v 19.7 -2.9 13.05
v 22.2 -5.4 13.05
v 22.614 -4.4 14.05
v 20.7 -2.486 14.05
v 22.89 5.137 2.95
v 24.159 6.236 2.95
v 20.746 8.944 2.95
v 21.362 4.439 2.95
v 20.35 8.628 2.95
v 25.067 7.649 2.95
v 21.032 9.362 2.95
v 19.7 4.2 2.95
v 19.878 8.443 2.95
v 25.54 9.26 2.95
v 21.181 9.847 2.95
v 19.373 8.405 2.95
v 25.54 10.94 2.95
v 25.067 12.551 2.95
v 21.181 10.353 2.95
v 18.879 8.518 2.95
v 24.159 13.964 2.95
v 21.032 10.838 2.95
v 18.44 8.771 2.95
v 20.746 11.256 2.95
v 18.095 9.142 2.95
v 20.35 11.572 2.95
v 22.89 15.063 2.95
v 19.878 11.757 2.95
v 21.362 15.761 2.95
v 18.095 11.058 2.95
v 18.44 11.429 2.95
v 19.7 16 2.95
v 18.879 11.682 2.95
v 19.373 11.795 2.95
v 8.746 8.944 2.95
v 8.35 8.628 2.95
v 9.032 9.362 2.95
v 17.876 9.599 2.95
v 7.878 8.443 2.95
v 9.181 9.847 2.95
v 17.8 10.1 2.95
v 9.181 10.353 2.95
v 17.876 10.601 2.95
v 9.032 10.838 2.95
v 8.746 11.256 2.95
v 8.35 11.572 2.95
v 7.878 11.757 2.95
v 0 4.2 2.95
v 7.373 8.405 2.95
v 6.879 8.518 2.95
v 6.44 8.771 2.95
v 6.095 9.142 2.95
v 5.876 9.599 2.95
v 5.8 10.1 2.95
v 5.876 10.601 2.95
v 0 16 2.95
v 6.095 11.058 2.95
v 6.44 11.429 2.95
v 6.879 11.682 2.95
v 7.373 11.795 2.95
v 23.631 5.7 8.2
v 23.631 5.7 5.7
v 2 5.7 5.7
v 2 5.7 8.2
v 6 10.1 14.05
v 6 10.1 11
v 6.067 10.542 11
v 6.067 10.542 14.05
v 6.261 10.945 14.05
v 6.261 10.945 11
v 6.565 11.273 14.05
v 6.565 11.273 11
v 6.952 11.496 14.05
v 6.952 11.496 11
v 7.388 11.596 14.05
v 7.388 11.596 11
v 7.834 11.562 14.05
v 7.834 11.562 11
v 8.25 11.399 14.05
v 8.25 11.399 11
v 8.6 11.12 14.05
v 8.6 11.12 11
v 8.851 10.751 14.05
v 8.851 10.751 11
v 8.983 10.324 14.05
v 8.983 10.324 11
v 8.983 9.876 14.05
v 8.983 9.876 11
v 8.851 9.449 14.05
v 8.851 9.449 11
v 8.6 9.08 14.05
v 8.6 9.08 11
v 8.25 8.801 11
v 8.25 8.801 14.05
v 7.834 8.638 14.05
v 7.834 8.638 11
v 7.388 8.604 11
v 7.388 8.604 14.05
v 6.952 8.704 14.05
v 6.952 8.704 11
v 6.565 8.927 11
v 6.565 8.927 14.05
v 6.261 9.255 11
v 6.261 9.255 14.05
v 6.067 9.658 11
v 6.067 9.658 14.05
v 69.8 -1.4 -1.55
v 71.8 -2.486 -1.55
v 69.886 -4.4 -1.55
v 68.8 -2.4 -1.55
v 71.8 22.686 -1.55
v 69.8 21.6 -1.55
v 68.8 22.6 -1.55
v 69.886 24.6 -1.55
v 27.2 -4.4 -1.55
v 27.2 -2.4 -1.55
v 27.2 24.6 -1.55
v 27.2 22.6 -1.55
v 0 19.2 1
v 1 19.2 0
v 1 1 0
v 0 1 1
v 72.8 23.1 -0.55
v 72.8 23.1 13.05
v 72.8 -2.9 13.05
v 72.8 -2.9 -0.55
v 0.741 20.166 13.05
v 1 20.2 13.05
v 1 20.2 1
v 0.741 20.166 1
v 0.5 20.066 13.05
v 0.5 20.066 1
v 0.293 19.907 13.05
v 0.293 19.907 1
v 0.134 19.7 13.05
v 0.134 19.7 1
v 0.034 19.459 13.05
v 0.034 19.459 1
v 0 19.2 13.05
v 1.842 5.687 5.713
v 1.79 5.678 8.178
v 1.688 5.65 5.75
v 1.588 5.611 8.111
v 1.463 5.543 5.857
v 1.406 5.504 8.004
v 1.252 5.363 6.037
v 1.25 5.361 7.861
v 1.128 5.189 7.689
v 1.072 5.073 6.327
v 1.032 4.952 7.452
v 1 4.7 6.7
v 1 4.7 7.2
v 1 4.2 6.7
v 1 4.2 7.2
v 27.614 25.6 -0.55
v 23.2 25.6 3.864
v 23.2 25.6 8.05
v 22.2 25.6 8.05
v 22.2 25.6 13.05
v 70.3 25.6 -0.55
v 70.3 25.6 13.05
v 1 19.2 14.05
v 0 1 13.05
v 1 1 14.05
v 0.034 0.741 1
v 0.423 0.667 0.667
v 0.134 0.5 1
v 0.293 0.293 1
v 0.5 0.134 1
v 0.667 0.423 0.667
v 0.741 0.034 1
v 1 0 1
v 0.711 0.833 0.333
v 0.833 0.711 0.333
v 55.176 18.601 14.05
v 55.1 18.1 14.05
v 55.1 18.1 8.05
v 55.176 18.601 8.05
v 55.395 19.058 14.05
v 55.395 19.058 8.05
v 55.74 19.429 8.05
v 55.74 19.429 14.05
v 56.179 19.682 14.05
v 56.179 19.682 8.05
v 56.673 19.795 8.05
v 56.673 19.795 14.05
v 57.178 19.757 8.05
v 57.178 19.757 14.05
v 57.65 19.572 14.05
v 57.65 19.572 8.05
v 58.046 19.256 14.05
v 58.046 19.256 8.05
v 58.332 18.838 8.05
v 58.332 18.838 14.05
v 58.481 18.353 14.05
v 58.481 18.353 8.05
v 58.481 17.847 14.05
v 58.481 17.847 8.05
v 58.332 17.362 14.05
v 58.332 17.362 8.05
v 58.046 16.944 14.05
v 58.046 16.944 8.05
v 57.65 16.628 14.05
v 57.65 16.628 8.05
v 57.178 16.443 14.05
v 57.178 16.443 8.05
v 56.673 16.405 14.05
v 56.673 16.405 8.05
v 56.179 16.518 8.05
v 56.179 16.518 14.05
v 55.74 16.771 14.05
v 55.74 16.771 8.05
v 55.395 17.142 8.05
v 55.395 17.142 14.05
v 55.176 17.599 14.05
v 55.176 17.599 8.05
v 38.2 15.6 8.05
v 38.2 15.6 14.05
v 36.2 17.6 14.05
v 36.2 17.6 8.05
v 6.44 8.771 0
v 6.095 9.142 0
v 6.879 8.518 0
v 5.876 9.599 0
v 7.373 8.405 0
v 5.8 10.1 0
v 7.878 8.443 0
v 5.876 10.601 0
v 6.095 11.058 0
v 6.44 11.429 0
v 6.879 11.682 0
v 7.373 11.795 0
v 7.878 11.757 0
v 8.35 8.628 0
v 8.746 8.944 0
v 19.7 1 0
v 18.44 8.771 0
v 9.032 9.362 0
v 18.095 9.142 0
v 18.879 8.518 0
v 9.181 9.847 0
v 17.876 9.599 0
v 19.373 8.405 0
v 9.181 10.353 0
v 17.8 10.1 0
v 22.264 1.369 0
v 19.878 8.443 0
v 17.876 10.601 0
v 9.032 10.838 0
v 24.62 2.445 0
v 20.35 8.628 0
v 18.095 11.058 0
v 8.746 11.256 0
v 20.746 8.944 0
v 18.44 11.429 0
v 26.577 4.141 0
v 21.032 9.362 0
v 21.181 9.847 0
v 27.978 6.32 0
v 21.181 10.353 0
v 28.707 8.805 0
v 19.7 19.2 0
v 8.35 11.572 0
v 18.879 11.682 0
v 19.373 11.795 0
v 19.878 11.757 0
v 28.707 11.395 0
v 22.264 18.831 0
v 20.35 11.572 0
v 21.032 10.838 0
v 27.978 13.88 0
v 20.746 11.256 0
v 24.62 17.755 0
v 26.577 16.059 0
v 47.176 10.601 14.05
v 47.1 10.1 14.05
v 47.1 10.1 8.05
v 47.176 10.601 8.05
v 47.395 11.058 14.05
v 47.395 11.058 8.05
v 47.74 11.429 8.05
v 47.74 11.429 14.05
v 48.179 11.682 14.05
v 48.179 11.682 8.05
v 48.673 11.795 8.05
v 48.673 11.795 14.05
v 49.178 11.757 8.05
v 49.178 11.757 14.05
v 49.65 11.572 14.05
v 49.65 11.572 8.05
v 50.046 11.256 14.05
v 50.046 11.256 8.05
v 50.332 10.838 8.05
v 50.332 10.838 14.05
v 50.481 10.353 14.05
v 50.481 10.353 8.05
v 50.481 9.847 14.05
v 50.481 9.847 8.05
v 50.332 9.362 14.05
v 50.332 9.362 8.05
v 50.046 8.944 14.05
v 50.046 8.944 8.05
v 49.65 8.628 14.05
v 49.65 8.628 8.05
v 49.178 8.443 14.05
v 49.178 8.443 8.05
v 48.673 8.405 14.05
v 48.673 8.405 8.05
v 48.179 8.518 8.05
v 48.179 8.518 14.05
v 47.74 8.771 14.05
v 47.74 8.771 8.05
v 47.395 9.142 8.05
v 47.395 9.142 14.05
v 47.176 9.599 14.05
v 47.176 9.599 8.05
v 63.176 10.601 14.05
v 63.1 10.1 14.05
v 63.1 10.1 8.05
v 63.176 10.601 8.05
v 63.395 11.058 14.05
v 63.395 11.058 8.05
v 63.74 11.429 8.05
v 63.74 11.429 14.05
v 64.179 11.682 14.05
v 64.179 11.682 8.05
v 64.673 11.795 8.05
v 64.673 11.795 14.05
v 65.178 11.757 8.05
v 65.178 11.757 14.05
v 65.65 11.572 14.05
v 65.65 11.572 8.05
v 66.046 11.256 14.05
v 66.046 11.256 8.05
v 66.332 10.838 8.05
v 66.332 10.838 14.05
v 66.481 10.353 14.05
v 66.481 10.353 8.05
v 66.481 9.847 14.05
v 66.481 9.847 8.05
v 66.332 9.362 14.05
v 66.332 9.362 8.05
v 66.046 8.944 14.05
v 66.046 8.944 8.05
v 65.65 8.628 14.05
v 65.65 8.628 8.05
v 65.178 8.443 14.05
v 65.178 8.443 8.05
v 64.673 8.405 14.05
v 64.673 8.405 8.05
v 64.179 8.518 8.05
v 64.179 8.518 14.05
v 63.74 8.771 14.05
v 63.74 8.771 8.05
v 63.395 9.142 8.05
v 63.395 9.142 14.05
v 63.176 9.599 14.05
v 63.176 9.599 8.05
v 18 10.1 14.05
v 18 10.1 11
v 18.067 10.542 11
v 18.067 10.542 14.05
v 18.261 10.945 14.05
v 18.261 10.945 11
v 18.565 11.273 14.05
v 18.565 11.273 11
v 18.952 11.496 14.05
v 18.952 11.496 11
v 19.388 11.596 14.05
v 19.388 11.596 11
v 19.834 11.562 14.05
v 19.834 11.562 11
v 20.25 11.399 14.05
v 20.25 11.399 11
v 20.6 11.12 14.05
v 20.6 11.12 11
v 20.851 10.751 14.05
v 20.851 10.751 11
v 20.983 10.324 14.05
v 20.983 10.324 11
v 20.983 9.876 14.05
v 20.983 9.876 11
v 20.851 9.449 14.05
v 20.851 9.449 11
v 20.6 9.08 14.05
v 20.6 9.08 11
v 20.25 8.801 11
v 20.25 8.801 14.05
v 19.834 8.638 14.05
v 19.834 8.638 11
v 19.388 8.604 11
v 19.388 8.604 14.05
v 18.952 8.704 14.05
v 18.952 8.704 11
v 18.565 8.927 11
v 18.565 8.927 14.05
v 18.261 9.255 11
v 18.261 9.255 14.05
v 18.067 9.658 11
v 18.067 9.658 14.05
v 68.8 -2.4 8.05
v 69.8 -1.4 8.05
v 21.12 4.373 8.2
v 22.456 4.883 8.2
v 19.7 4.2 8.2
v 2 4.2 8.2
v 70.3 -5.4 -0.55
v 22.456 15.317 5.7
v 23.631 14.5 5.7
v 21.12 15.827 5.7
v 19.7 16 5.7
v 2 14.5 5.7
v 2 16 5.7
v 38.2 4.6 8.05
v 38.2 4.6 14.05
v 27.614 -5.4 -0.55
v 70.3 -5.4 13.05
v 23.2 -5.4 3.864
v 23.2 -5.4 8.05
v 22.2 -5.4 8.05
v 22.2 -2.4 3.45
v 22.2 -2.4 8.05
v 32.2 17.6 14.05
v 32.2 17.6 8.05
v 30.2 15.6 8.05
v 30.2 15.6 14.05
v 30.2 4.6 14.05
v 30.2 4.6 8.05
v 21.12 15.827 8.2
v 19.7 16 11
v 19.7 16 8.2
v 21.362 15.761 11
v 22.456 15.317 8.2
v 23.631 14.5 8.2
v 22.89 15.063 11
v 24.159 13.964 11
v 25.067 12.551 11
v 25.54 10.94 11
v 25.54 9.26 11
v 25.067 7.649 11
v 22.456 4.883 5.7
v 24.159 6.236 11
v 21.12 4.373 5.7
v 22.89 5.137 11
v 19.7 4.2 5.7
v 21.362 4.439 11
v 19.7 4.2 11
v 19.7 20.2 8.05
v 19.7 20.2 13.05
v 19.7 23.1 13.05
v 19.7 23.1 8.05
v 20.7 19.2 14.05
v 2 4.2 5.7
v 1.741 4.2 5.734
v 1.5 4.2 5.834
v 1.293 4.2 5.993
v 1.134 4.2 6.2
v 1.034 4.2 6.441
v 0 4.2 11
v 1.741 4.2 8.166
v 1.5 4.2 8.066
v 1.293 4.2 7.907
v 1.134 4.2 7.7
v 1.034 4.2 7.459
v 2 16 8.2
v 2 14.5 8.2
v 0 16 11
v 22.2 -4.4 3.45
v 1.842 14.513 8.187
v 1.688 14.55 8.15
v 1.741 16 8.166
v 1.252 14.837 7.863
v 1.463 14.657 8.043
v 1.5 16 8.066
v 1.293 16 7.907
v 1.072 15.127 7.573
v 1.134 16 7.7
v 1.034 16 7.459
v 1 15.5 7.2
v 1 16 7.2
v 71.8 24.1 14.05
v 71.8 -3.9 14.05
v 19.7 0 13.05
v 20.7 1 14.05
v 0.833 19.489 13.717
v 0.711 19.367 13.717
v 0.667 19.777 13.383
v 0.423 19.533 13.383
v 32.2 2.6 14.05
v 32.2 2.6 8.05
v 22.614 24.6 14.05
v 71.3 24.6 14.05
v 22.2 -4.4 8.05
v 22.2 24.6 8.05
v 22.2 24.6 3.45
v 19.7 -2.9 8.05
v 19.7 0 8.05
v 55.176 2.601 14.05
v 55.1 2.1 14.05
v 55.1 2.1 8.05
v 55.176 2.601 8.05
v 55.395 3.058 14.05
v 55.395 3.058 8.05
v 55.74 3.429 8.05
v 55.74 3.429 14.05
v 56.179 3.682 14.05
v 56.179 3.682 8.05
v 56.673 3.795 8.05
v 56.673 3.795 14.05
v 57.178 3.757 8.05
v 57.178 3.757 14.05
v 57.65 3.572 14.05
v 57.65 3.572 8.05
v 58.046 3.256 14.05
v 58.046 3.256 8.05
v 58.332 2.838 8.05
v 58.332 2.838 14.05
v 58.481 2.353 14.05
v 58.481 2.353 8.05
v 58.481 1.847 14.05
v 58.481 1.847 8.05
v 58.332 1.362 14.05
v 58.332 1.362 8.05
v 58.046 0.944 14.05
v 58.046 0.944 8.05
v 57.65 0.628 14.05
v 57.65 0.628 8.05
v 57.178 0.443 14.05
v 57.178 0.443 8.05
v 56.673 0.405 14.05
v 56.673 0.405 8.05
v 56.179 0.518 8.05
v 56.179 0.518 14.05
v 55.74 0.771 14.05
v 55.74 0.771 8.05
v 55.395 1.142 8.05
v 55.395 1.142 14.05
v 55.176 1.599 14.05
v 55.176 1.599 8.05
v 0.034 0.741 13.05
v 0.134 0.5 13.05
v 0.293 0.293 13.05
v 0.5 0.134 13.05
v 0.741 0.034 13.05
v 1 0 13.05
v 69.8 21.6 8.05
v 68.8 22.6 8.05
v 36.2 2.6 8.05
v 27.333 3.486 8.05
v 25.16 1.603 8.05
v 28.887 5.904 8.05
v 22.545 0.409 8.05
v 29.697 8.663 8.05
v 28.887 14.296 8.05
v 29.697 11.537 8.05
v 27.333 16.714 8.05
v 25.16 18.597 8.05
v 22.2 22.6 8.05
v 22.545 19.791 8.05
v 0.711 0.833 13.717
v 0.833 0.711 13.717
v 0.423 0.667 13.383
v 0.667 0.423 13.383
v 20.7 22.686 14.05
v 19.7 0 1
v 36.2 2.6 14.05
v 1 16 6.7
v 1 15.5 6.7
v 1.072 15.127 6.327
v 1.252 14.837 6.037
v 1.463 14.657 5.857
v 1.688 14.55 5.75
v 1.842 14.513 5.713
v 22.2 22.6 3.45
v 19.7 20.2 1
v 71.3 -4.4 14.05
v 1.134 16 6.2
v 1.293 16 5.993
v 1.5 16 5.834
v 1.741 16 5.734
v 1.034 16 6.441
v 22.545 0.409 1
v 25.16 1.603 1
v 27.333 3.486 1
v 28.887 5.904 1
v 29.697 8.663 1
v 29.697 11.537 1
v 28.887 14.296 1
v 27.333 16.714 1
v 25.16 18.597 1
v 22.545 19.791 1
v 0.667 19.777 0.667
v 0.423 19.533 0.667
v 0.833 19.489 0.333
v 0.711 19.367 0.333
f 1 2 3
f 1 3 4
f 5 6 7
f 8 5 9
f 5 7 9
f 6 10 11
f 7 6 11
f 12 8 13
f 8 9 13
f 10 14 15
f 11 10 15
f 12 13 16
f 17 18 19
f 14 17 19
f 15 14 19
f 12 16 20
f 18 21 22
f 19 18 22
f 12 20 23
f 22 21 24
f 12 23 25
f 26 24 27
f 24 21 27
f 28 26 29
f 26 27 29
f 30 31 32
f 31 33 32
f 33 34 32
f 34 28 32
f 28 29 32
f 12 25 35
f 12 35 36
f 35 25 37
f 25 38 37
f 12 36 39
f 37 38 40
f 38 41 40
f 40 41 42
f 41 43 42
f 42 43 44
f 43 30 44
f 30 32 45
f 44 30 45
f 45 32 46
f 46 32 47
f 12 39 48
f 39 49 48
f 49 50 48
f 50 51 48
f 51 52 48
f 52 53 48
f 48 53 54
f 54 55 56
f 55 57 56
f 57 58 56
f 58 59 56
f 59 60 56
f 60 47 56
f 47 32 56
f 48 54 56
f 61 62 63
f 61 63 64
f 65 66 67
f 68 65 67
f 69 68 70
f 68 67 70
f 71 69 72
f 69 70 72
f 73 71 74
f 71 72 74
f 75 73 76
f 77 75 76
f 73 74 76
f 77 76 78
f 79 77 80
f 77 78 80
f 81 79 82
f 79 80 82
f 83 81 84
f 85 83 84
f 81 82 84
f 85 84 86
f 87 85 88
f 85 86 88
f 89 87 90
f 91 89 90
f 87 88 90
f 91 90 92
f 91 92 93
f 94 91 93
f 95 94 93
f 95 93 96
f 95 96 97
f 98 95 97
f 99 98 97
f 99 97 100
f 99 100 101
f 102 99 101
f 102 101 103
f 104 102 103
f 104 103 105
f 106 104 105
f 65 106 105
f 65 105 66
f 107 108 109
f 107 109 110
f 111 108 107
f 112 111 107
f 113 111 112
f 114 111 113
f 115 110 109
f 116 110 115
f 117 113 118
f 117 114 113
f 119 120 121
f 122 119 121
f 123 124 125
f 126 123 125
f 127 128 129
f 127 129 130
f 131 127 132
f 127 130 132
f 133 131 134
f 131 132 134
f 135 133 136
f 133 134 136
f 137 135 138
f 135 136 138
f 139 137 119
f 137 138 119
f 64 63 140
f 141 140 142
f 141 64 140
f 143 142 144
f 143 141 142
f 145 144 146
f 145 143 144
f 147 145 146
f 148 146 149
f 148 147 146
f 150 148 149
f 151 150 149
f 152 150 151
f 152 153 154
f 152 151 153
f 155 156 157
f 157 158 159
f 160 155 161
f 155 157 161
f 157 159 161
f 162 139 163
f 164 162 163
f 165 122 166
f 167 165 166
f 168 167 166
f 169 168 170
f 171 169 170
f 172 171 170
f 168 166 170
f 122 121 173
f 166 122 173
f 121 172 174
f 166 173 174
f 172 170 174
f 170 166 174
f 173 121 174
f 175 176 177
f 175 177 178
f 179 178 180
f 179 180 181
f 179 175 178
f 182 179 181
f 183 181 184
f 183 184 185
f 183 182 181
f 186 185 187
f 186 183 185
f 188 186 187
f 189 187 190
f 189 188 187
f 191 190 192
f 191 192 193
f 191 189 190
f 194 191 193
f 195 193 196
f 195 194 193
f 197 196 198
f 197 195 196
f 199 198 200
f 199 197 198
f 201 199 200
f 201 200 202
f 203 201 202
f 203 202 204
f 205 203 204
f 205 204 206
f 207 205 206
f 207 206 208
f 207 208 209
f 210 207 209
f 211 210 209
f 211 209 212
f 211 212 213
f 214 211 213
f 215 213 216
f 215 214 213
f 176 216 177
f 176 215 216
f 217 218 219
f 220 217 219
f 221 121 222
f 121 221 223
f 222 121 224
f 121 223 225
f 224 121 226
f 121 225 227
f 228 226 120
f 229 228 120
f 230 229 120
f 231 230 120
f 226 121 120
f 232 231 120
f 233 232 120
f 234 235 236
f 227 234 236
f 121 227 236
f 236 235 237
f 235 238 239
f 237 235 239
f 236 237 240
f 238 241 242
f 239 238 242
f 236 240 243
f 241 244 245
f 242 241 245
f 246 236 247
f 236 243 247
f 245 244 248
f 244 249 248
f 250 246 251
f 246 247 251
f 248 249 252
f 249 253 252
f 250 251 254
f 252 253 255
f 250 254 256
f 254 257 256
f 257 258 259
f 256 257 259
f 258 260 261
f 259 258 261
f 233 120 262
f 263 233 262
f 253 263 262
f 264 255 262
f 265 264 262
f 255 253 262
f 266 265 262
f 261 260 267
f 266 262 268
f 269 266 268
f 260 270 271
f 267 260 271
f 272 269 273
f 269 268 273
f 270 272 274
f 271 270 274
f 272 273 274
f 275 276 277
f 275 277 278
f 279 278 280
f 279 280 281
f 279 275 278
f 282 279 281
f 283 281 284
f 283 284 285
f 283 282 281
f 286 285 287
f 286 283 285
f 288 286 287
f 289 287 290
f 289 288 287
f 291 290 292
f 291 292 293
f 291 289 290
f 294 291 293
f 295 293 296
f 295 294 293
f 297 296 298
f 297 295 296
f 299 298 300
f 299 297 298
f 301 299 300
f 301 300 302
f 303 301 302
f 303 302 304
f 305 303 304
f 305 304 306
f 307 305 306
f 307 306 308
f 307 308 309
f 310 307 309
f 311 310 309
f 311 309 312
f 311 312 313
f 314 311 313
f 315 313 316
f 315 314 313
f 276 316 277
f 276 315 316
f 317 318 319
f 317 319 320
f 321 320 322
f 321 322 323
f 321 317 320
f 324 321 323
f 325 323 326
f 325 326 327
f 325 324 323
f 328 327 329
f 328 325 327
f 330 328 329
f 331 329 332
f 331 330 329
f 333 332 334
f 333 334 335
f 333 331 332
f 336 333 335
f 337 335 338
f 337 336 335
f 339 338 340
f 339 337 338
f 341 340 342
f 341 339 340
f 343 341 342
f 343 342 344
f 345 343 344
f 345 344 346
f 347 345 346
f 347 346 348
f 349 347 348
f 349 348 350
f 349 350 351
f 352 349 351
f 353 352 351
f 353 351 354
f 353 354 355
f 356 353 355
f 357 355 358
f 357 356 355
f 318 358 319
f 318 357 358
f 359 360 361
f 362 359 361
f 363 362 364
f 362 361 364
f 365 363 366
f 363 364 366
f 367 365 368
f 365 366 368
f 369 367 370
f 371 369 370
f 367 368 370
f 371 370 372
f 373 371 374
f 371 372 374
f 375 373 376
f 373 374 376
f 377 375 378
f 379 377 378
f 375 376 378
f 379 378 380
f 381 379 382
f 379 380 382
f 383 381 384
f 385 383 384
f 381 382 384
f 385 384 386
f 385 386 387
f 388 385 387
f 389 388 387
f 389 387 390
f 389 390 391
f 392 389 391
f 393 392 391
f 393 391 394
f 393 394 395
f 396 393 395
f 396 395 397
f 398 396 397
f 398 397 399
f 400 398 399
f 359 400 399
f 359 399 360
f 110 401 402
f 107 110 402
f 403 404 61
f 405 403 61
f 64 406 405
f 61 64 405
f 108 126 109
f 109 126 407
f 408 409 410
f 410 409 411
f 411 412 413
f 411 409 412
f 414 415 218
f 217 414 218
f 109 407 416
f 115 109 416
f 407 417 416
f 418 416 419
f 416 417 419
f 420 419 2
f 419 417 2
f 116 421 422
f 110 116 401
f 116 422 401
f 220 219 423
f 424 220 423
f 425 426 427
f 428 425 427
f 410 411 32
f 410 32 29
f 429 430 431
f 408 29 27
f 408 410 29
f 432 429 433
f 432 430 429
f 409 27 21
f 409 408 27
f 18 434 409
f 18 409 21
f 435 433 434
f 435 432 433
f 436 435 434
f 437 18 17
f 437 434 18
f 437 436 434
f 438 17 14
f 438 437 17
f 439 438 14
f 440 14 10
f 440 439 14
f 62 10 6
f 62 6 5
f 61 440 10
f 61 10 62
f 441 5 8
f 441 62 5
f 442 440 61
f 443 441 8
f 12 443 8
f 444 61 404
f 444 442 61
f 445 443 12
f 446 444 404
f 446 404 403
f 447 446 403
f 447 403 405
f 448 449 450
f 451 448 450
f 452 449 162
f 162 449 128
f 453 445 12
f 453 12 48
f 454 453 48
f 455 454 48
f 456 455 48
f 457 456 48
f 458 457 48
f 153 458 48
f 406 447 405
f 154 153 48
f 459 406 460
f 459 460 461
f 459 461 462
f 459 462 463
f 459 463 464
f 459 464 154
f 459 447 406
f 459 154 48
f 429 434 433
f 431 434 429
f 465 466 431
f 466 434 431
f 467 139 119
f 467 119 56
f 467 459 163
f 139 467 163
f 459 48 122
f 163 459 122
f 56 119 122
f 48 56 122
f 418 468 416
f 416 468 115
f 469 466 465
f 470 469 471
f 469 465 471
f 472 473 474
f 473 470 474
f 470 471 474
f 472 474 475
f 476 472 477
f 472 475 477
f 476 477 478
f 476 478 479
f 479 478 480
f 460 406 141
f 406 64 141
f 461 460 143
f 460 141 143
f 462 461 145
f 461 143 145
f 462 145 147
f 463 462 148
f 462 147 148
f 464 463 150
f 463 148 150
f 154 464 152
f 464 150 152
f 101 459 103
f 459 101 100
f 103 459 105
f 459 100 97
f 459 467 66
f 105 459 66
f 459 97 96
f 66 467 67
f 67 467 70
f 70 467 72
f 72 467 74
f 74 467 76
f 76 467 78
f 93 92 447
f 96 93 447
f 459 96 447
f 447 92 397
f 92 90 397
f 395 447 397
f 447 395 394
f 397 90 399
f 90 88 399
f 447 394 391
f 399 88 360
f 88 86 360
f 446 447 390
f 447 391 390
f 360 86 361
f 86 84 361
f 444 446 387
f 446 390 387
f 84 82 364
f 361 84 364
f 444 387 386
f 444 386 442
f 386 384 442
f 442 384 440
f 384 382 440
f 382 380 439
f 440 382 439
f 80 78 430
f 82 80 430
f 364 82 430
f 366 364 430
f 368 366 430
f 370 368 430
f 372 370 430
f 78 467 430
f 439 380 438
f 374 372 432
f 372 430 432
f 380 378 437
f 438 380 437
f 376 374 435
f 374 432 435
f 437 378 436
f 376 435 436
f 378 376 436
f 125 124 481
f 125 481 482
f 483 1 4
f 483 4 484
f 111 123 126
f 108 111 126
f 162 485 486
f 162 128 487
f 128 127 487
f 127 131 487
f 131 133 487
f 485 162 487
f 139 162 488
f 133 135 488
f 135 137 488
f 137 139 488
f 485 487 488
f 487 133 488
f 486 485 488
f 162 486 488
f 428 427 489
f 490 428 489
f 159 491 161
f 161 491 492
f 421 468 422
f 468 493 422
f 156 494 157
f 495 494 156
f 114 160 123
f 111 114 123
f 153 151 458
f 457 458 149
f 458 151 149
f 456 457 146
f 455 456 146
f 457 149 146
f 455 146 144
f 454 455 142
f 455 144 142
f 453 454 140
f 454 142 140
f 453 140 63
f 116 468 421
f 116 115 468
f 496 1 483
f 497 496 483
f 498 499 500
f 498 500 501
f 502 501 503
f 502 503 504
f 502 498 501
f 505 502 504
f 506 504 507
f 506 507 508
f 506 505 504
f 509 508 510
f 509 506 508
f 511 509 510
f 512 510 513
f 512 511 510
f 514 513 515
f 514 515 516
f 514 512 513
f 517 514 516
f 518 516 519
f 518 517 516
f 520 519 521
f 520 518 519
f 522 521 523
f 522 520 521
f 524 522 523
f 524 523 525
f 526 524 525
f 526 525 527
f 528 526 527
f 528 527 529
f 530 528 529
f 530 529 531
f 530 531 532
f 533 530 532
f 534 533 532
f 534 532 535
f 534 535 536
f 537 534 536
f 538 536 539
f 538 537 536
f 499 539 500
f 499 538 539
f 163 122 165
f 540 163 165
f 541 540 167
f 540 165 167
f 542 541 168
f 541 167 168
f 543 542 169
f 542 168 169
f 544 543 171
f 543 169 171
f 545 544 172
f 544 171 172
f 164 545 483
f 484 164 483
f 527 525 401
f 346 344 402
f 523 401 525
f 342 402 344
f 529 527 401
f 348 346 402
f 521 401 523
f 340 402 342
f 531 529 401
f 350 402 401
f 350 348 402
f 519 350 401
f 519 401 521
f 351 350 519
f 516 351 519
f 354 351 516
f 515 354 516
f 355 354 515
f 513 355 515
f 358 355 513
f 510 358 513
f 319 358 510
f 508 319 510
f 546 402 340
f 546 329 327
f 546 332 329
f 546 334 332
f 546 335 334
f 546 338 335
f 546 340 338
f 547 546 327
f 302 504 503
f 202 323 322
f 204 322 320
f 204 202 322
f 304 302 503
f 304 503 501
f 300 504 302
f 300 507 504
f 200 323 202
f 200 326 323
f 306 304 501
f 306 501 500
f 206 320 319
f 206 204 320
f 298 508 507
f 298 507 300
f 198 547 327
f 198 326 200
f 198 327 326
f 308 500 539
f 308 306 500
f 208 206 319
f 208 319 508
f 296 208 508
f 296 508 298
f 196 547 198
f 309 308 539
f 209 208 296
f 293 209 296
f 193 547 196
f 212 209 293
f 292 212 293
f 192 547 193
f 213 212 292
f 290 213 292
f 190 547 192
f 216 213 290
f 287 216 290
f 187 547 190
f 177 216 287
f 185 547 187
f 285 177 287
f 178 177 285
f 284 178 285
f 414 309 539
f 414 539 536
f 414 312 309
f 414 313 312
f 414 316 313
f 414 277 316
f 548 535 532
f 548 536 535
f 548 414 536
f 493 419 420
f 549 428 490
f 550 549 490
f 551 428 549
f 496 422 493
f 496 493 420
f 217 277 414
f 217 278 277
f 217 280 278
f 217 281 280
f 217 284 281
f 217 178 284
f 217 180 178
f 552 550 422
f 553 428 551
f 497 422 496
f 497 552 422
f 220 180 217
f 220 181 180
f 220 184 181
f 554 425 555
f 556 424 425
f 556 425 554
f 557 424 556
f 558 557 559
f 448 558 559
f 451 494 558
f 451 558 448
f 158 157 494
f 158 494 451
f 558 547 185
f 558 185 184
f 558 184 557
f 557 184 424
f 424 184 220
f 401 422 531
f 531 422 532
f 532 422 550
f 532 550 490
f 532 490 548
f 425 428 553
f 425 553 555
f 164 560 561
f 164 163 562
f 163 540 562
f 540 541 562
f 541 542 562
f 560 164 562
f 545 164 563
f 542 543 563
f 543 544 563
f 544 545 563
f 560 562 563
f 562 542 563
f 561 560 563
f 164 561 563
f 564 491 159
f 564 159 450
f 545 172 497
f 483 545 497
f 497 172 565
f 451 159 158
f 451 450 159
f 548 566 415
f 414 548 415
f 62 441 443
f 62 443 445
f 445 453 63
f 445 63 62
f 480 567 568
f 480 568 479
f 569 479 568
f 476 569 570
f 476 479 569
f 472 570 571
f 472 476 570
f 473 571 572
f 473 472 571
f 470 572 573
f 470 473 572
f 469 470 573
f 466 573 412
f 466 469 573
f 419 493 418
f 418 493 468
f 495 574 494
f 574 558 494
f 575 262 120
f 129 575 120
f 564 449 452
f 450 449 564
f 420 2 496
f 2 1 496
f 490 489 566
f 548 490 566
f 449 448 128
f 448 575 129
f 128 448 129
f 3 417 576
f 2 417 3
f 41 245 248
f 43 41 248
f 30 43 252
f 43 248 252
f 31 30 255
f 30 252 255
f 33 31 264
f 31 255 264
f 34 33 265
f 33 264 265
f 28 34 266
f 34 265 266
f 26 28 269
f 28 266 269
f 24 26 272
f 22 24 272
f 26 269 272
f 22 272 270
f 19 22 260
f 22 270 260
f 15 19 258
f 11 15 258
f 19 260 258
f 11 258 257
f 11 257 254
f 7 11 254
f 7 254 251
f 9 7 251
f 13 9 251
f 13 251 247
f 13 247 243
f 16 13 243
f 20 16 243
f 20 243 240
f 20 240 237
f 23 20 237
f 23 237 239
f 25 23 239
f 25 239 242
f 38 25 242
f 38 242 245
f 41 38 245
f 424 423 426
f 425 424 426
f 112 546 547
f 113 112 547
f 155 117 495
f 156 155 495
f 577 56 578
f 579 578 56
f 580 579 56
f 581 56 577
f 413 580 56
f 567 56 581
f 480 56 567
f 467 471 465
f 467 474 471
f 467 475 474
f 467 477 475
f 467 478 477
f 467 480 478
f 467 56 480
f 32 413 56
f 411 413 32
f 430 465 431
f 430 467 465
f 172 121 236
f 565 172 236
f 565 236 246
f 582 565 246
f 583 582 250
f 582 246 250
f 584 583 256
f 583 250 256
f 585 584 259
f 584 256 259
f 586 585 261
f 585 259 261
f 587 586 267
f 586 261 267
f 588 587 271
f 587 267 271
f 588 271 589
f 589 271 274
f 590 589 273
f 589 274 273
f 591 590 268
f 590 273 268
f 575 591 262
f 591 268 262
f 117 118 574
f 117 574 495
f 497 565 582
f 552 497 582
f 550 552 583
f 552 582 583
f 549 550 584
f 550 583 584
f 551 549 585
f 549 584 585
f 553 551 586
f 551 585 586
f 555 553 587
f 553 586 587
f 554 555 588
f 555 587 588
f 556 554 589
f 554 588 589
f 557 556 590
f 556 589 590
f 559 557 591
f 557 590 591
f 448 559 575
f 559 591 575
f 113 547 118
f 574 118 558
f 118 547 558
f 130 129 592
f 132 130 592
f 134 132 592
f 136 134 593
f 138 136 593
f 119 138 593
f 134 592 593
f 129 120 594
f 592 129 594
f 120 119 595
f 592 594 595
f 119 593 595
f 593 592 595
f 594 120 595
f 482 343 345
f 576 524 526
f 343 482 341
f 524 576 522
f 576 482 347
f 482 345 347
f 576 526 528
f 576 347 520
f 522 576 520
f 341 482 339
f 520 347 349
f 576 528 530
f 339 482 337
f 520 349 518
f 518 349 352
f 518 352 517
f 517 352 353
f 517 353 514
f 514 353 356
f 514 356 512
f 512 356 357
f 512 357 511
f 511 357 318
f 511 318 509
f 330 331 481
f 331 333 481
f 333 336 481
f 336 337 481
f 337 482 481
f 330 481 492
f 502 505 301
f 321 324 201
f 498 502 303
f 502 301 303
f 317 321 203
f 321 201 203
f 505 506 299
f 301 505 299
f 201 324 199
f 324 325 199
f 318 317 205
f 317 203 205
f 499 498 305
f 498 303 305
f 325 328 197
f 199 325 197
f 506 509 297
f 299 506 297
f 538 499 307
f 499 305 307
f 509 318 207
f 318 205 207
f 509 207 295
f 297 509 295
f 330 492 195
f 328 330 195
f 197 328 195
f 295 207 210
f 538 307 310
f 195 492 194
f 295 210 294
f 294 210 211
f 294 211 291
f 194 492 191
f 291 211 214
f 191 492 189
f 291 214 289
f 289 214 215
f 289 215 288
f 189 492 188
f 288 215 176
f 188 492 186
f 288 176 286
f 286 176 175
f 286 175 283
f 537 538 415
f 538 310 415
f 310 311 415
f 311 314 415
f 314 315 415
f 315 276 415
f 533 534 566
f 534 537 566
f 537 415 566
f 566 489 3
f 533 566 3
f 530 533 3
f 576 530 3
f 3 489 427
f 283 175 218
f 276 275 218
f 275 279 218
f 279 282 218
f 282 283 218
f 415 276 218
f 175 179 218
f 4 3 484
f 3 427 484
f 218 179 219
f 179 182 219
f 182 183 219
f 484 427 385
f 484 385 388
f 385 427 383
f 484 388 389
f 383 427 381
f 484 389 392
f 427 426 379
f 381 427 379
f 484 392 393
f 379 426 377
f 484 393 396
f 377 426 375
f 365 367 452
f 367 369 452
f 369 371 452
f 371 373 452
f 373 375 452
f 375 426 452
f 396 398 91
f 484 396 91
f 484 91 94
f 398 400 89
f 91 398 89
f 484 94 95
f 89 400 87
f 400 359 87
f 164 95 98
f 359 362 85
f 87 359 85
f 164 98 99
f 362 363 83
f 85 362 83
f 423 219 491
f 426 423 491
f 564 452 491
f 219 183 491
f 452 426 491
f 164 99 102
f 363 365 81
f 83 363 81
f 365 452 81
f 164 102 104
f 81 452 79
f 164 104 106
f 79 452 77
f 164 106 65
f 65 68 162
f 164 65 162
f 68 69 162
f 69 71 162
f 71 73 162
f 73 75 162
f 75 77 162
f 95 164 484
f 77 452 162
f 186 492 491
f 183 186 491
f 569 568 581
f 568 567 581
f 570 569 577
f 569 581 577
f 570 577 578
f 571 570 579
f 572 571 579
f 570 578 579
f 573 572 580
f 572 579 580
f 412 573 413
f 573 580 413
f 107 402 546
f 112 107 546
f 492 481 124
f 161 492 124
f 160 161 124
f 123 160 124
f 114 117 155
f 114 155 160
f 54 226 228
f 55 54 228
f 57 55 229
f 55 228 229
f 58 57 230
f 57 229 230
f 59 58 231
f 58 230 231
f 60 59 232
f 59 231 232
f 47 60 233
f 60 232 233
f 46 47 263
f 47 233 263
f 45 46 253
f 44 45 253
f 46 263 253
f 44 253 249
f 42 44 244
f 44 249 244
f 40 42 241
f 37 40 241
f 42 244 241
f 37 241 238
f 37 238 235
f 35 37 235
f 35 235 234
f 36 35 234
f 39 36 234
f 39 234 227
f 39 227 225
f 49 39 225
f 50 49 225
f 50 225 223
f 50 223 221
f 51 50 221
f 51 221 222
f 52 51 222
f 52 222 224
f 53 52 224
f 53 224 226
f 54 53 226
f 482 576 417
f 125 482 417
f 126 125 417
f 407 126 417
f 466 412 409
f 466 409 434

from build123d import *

# Parameters (mm, degrees)
BOSS_EXTRUDE1_DEPTH     = 11
CUT_EXTRUDE2_DEPTH      = 8.05
BOSS_EXTRUDE2_REACH     = 38.858
SKETCH4_W               = 2.5
SKETCH4_H               = 1.5
BOSS_EXTRUDE5_DEPTH     = 3.05
FILLET3_R               = 1
SKETCH8_R               = 1.7
BOSS_EXTRUDE3_DEPTH     = 6
CHAMFER1_SIZE           = 2.5
CUT_EXTRUDE5_REACH      = 80.439
SKETCH10_R              = 1.7
BOSS_EXTRUDE4_DEPTH     = 9.6
CHAMFER3_SIZE           = 5
CHAMFER2_SIZE           = 1
CUT_EXTRUDE6_DEPTH      = 78.764773516
CUT_EXTRUDE6_DEPTH_BACK = 78.764773516
SKETCH15_R              = 1.5
CUT_EXTRUDE7_DEPTH      = 79.438526886


with BuildPart() as part:
    # Sketch1 → Boss-Extrude1 (new body)
    with BuildSketch(Plane.XY):
        with BuildLine():
            Line((1, 0), (19.7, 0))
            ThreePointArc((19.7, 0), (29.8, 10.1), (19.7, 20.2))
            Line((19.7, 20.2), (1, 20.2))
            ThreePointArc((1, 20.2), (0.292893219, 19.907106781), (0, 19.2))
            Line((0, 19.2), (0, 1))
            ThreePointArc((0, 1), (0.292893219, 0.292893219), (1, 0))
        make_face()
    extrude(amount=BOSS_EXTRUDE1_DEPTH)

    # Sketch3 → Cut-Extrude2 (cut)
    with BuildSketch(Plane.XY.offset(11)):
        with BuildLine():
            Line((0, 16), (19.7, 16))
            ThreePointArc((19.7, 16), (25.6, 10.1), (19.7, 4.2))
            Line((19.7, 4.2), (0, 4.2))
            Line((0, 4.2), (0, 16))
        make_face()
    extrude(amount=-CUT_EXTRUDE2_DEPTH, mode=Mode.SUBTRACT)

    # Sketch4 → Boss-Extrude2 (add, up to next)
    with BuildSketch(Plane.ZY.offset(-1), mode=Mode.PRIVATE) as boss_extrude2_sk1:
        with Locations((6.95, 15.25)):
            Rectangle(SKETCH4_W, SKETCH4_H)
    boss_extrude2_tool1 = extrude(boss_extrude2_sk1.sketch, amount=-BOSS_EXTRUDE2_REACH, mode=Mode.PRIVATE) - part.part
    # Sketch4 → Boss-Extrude2 (add, up to next)
    with BuildSketch(Plane.ZY.offset(-1), mode=Mode.PRIVATE) as boss_extrude2_sk2:
        with Locations((6.95, 4.95)):
            Rectangle(SKETCH4_W, SKETCH4_H)
    boss_extrude2_tool2 = extrude(boss_extrude2_sk2.sketch, amount=-BOSS_EXTRUDE2_REACH, mode=Mode.PRIVATE) - part.part
    add(boss_extrude2_tool1.solids().sort_by_distance((1, 15.25, 6.95))[0])
    add(boss_extrude2_tool2.solids().sort_by_distance((1, 4.95, 6.95))[0])

    # Sketch14 → Boss-Extrude5 (add)
    with BuildSketch(Plane.XY.offset(11)):
        with BuildLine():
            Line((0, 19.2), (0, 1))
            ThreePointArc((0, 1), (0.292893219, 0.292893219), (1, 0))
            Line((1, 0), (19.7, 0))
            ThreePointArc((19.7, 0), (29.8, 10.1), (19.7, 20.2))
            Line((19.7, 20.2), (1, 20.2))
            ThreePointArc((1, 20.2), (0.292893219, 19.907106781), (0, 19.2))
        make_face()
    extrude(amount=BOSS_EXTRUDE5_DEPTH)

    # Fillet3
    fillet3_edges = [part.edges().sort_by_distance(p)[0] for p in [
        (1, 15.25, 5.7),
        (1, 14.5, 6.95),
        (1, 15.25, 8.2),
        (1, 4.95, 5.7),
        (1, 4.95, 8.2),
        (1, 5.7, 6.95),
    ]]
    fillet(fillet3_edges, radius=FILLET3_R)

    # Sketch8 → Boss-Extrude3 (add)
    with BuildSketch(Plane(origin=(0, 0, 14.05), x_dir=(-1, 0, 0), z_dir=(0, 0, -1))):
        with BuildLine():
            Line((-19.7, 25.6), (-72.8, 25.6))
            Line((-72.8, 25.6), (-72.8, -5.4))
            Line((-72.8, -5.4), (-19.7, -5.4))
            Line((-19.7, -5.4), (-19.7, 4.2))
            ThreePointArc((-19.7, 4.2), (-25.6, 10.1), (-19.7, 16))
            Line((-19.7, 16), (-19.7, 25.6))
        make_face()
        with Locations((-64.8, 10.1)):
            Circle(SKETCH8_R, mode=Mode.SUBTRACT)
        with Locations((-56.8, 2.1)):
            Circle(SKETCH8_R, mode=Mode.SUBTRACT)
        with Locations((-48.8, 10.1)):
            Circle(SKETCH8_R, mode=Mode.SUBTRACT)
        with Locations((-56.8, 18.1)):
            Circle(SKETCH8_R, mode=Mode.SUBTRACT)
    extrude(amount=BOSS_EXTRUDE3_DEPTH)

    # Chamfer1
    chamfer1_edges = [part.edges().sort_by_distance(p)[0] for p in [
        (19.7, -5.4, 11.05),
        (19.7, 25.6, 11.05),
        (72.8, 25.6, 11.05),
        (72.8, -5.4, 11.05),
    ]]
    chamfer(chamfer1_edges, length=CHAMFER1_SIZE)

    # Sketch10 → Cut-Extrude5 (cut, up to next)
    with BuildSketch(Plane(origin=(0, 0, 0), x_dir=(-1, 0, 0), z_dir=(0, 0, -1)), mode=Mode.PRIVATE) as cut_extrude5_sk1:
        with Locations((-7.5, 10.1)):
            Circle(SKETCH10_R)
    cut_extrude5_tool1 = extrude(cut_extrude5_sk1.sketch, amount=-CUT_EXTRUDE5_REACH, mode=Mode.PRIVATE) & part.part
    # Sketch10 → Cut-Extrude5 (cut, up to next)
    with BuildSketch(Plane(origin=(0, 0, 0), x_dir=(-1, 0, 0), z_dir=(0, 0, -1)), mode=Mode.PRIVATE) as cut_extrude5_sk2:
        with Locations((-19.5, 10.1)):
            Circle(SKETCH10_R)
    cut_extrude5_tool2 = extrude(cut_extrude5_sk2.sketch, amount=-CUT_EXTRUDE5_REACH, mode=Mode.PRIVATE) & part.part
    add(cut_extrude5_tool1.solids().sort_by_distance((7.5, 10.1, 0))[0], mode=Mode.SUBTRACT)
    add(cut_extrude5_tool2.solids().sort_by_distance((19.5, 10.1, 0))[0], mode=Mode.SUBTRACT)

    # Sketch11 → Boss-Extrude4 (add)
    with BuildSketch(Plane(origin=(0, 0, 8.05), x_dir=(-1, 0, 0), z_dir=(0, 0, -1))):
        Polygon((-22.2, 25.6), (-70.3, 25.6), (-72.8, 23.1), (-72.8, -2.9), (-70.3, -5.4), (-22.2, -5.4), (-22.2, -2.4), (-68.8, -2.4), (-69.8, -1.4), (-69.8, 21.6), (-68.8, 22.6), (-22.2, 22.6), align=None)
    extrude(amount=BOSS_EXTRUDE4_DEPTH)

    # Chamfer3
    chamfer3_edges = [part.edges().sort_by_distance(p)[0] for p in [
        (22.2, 24.1, -1.55),
        (22.2, -3.9, -1.55),
    ]]
    chamfer(chamfer3_edges, length=CHAMFER3_SIZE)

    # Chamfer2
    chamfer2_edges = [part.edges().sort_by_distance(p)[0] for p in [
        (48.75, 25.6, -1.55),
        (46.25, -5.4, 14.05),
        (72.8, 10.1, 14.05),
        (72.8, 10.1, -1.55),
        (46.25, 25.6, 14.05),
        (22.2, 25.6, 5.75),
        (22.2, -5.4, 5.75),
        (24.7, -5.4, 0.95),
        (24.7, 25.6, 0.95),
        (48.75, -5.4, -1.55),
        (71.55, -4.15, -1.55),
        (71.55, 24.35, -1.55),
        (10.35, 0, 0),
        (29.8, 10.1, 0),
        (10.35, 20.2, 0),
        (0.292893219, 19.907106781, 0),
        (0.292893219, 0.292893219, 0),
        (0, 10.1, 0),
        (0, 10.1, 14.05),
        (10.35, 0, 14.05),
        (19.7, -1.45, 14.05),
        (20.95, -4.15, 14.05),
        (0.292893219, 0.292893219, 14.05),
        (0.292893219, 19.907106781, 14.05),
        (10.35, 20.2, 14.05),
        (19.7, 21.65, 14.05),
        (20.95, 24.35, 14.05),
    ]]
    chamfer(chamfer2_edges, length=CHAMFER2_SIZE - 0.0001)  # a hair under: the kernel refuses the full size

    # Sketch12 → Cut-Extrude6 (cut, two sides: drawn at the far end of the back side and taken through both)
    with BuildSketch(Plane(origin=(0, 0, 8.05), x_dir=(-1, 0, 0), z_dir=(0, 0, -1)).offset(-CUT_EXTRUDE6_DEPTH_BACK)):
        Polygon((-38.2, 4.6), (-38.2, 15.6), (-36.2, 17.6), (-32.2, 17.6), (-30.2, 15.6), (-30.2, 4.6), (-32.2, 2.6), (-36.2, 2.6), align=None)
    extrude(amount=CUT_EXTRUDE6_DEPTH + CUT_EXTRUDE6_DEPTH_BACK, mode=Mode.SUBTRACT)

    # Sketch15 → Cut-Extrude7 (cut, through all)
    with BuildSketch(Plane(origin=(0, 0, 0), x_dir=(-1, 0, 0), z_dir=(0, 0, -1))):
        with Locations((-19.5, 10.1)):
            Circle(SKETCH15_R)
        with Locations((-7.5, 10.1)):
            Circle(SKETCH15_R)
    extrude(amount=-CUT_EXTRUDE7_DEPTH, mode=Mode.SUBTRACT)


solid = part.part
